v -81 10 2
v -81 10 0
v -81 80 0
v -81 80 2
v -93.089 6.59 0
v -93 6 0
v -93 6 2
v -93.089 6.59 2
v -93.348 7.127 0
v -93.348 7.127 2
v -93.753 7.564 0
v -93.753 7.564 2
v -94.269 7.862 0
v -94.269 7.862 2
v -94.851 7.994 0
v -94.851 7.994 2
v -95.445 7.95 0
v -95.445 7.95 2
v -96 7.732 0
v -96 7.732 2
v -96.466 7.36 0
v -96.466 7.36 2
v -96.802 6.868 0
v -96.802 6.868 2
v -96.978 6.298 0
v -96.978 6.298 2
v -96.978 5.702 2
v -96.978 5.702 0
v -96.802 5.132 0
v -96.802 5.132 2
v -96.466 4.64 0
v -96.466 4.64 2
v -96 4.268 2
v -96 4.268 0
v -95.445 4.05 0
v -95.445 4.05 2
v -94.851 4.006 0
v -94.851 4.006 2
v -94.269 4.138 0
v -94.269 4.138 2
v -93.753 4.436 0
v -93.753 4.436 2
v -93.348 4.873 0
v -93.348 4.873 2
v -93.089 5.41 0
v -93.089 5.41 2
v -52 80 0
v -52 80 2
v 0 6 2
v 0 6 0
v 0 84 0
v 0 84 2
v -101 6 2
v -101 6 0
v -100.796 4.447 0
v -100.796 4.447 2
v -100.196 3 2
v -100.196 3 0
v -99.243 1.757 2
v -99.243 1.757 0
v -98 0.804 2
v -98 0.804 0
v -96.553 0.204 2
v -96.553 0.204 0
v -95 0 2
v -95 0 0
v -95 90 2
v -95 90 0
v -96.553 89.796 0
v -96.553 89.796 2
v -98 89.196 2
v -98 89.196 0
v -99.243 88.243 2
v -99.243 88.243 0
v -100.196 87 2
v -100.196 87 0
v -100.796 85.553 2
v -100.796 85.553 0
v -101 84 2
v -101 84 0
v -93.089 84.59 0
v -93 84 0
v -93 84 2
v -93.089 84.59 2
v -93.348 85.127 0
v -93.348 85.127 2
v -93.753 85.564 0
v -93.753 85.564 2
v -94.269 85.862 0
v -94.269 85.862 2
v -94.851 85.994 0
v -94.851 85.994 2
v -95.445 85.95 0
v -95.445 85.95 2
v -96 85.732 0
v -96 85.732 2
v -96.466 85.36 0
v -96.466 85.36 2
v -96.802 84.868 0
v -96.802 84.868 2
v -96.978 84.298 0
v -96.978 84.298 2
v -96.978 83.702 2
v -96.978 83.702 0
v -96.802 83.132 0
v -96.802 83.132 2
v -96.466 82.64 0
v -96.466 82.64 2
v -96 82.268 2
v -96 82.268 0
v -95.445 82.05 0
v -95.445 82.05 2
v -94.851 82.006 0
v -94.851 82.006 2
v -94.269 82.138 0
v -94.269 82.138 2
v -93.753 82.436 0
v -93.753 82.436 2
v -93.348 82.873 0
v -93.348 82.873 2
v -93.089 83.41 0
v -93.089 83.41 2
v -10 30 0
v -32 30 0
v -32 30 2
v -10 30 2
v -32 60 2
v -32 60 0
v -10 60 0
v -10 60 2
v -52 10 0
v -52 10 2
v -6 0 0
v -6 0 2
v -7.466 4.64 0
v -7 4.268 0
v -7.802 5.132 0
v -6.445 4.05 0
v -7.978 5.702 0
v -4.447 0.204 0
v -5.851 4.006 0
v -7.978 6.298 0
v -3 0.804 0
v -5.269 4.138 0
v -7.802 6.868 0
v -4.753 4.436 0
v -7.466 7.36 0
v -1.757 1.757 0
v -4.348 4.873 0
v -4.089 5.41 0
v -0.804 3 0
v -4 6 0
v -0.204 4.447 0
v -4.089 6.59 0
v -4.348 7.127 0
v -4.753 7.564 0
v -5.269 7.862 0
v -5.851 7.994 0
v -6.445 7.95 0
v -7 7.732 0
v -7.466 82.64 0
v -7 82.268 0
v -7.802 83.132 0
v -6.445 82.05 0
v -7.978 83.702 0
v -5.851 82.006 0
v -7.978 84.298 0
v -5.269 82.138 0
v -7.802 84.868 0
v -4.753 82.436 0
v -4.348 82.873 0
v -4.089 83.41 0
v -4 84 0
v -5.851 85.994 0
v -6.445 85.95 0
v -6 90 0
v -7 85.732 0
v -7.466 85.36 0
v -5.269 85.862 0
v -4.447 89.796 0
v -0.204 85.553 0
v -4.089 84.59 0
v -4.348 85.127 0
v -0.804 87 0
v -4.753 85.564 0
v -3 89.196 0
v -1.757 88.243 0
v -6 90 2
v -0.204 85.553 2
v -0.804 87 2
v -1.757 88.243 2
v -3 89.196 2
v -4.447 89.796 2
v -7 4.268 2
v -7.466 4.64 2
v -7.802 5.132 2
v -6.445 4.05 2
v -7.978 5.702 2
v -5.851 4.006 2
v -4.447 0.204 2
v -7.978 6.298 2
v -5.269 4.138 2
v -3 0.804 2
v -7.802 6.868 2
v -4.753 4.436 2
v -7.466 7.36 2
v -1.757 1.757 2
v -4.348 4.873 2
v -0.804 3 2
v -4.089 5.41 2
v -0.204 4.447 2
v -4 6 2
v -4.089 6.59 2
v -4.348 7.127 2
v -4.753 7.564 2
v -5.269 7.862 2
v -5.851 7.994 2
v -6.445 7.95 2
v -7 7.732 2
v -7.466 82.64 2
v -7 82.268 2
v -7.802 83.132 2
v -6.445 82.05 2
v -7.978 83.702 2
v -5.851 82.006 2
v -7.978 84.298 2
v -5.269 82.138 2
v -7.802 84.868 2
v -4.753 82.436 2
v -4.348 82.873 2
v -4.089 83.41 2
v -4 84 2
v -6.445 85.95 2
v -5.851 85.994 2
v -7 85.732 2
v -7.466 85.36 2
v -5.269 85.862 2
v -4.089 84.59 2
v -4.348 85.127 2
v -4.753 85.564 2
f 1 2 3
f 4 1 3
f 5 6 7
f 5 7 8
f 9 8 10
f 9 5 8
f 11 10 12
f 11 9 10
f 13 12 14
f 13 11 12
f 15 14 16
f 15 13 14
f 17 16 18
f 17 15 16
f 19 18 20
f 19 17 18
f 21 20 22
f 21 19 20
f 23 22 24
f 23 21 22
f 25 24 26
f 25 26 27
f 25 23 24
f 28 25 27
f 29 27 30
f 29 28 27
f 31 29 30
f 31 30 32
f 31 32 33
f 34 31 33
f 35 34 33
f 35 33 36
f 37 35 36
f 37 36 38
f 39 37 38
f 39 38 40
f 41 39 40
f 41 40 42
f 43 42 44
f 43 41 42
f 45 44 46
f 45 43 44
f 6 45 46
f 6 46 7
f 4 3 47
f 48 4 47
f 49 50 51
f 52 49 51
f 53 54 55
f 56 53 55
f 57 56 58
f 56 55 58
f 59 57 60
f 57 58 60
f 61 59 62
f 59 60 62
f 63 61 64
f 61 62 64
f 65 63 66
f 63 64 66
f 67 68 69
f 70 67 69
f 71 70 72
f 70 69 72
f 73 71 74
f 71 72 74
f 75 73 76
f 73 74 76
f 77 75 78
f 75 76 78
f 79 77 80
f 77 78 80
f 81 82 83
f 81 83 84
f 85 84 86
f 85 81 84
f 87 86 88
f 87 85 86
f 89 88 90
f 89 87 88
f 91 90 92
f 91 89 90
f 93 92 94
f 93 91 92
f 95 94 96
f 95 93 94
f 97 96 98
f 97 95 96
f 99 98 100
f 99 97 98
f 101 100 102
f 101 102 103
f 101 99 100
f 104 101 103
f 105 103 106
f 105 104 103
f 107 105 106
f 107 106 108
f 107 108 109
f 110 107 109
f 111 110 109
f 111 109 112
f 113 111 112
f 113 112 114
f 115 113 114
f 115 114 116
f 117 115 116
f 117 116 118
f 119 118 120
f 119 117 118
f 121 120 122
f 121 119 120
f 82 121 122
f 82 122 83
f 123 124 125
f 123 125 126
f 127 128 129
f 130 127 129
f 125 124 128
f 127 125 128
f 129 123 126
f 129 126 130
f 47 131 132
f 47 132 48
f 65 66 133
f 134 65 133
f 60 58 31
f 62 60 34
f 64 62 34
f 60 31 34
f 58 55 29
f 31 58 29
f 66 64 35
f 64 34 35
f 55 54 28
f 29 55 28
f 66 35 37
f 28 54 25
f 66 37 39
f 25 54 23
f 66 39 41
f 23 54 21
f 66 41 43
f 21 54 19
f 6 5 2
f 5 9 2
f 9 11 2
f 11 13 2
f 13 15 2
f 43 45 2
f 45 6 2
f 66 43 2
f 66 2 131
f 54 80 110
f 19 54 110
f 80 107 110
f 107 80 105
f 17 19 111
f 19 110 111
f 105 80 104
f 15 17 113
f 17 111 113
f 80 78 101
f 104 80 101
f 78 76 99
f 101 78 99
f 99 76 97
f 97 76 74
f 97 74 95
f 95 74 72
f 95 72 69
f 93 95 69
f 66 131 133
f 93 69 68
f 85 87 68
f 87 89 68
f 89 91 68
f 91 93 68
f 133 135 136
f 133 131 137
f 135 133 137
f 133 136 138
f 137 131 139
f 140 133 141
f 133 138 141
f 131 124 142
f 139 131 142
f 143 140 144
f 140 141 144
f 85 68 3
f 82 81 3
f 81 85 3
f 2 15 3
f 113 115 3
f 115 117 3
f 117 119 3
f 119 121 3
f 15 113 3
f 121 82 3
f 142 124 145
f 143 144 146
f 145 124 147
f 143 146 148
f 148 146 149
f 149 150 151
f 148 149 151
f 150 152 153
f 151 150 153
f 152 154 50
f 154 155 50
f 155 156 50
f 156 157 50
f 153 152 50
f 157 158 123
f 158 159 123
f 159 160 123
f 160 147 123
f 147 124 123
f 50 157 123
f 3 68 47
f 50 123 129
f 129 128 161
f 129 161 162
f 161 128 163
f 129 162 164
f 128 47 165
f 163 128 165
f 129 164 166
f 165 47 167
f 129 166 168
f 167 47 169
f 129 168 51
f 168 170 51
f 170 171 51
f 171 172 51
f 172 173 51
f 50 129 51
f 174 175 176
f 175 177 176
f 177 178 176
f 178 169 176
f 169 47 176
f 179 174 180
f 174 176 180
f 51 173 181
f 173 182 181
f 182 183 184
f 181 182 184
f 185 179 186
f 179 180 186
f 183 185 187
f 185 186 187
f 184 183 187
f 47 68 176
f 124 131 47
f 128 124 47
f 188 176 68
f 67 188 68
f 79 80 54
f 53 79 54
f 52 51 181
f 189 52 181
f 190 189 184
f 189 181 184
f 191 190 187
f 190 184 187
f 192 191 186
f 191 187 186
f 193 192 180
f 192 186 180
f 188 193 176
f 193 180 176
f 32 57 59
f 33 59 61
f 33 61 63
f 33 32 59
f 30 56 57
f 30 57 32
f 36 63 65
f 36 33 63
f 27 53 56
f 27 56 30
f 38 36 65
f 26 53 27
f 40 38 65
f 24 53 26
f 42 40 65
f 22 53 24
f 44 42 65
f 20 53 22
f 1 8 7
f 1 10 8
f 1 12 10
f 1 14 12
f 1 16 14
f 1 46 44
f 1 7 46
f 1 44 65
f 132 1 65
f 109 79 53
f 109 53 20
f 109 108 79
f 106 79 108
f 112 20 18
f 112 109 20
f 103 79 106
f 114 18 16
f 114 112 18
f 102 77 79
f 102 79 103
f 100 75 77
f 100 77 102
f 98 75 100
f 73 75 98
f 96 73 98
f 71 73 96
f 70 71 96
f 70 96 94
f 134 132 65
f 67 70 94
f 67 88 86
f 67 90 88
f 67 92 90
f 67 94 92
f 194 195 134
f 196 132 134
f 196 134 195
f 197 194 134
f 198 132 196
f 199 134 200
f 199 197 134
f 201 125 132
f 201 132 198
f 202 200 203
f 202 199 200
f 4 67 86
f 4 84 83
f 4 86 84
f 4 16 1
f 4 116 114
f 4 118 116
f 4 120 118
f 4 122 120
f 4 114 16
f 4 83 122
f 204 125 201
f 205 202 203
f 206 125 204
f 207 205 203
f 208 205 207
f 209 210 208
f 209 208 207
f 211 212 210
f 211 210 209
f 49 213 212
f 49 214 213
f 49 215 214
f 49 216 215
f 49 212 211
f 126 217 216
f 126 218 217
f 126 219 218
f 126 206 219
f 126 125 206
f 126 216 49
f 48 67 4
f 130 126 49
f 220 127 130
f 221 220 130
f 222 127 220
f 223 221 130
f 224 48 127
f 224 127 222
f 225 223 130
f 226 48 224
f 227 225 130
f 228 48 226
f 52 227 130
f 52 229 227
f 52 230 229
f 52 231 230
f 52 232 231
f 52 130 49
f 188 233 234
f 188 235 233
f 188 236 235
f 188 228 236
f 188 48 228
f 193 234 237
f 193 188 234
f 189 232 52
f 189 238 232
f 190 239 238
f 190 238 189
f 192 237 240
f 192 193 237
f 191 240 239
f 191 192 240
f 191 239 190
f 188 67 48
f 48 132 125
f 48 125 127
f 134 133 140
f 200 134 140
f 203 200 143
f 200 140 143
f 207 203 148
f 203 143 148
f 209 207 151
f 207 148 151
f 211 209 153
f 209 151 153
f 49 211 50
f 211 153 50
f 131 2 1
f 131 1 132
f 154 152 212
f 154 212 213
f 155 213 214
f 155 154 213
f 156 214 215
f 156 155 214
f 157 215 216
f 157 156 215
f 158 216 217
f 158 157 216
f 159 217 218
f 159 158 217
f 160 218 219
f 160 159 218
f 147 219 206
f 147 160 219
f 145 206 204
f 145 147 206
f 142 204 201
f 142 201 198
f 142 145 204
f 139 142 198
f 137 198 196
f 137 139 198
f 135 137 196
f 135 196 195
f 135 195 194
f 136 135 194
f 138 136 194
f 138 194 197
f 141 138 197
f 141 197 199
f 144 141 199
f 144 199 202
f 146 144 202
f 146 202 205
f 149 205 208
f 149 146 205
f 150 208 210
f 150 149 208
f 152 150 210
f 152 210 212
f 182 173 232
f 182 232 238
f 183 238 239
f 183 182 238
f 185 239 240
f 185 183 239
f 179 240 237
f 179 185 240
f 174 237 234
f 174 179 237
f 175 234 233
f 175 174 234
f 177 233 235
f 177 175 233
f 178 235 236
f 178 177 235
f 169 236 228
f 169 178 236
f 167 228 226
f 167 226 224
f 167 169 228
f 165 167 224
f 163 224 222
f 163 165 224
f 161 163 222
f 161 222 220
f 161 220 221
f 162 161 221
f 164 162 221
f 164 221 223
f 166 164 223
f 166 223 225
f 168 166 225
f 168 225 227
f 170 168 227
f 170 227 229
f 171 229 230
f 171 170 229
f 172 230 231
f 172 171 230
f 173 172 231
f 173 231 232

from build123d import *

# Parameters (mm, degrees)
F0_R     = 2
F0_W     = 29
F0_H     = 70
F0_W_2   = 22
F0_H_2   = 30
F1_DEPTH = 2


with BuildPart() as f1:
    # F0 (on Top) → F1 (new body)
    with BuildSketch(Plane.XY):
        with BuildLine():
            Line((-95, 0), (-6, 0))
            ThreePointArc((-6, 0), (-1.757359, 1.757359), (0, 6))
            Line((0, 6), (0, 84))
            ThreePointArc((0, 84), (-1.757359, 88.242641), (-6, 90))
            Line((-6, 90), (-95, 90))
            ThreePointArc((-95, 90), (-99.242641, 88.242641), (-101, 84))
            Line((-101, 84), (-101, 6))
            ThreePointArc((-101, 6), (-99.242641, 1.757359), (-95, 0))
        make_face()
        with Locations((-95, 6)):
            Circle(F0_R, mode=Mode.SUBTRACT)
        with Locations((-6, 6)):
            Circle(F0_R, mode=Mode.SUBTRACT)
        with Locations((-66.5, 45)):
            Rectangle(F0_W, F0_H, mode=Mode.SUBTRACT)
        with Locations((-95, 84)):
            Circle(F0_R, mode=Mode.SUBTRACT)
        with Locations((-21, 45)):
            Rectangle(F0_W_2, F0_H_2, mode=Mode.SUBTRACT)
        with Locations((-6, 84)):
            Circle(F0_R, mode=Mode.SUBTRACT)
    extrude(amount=F1_DEPTH)


solid = f1.part
